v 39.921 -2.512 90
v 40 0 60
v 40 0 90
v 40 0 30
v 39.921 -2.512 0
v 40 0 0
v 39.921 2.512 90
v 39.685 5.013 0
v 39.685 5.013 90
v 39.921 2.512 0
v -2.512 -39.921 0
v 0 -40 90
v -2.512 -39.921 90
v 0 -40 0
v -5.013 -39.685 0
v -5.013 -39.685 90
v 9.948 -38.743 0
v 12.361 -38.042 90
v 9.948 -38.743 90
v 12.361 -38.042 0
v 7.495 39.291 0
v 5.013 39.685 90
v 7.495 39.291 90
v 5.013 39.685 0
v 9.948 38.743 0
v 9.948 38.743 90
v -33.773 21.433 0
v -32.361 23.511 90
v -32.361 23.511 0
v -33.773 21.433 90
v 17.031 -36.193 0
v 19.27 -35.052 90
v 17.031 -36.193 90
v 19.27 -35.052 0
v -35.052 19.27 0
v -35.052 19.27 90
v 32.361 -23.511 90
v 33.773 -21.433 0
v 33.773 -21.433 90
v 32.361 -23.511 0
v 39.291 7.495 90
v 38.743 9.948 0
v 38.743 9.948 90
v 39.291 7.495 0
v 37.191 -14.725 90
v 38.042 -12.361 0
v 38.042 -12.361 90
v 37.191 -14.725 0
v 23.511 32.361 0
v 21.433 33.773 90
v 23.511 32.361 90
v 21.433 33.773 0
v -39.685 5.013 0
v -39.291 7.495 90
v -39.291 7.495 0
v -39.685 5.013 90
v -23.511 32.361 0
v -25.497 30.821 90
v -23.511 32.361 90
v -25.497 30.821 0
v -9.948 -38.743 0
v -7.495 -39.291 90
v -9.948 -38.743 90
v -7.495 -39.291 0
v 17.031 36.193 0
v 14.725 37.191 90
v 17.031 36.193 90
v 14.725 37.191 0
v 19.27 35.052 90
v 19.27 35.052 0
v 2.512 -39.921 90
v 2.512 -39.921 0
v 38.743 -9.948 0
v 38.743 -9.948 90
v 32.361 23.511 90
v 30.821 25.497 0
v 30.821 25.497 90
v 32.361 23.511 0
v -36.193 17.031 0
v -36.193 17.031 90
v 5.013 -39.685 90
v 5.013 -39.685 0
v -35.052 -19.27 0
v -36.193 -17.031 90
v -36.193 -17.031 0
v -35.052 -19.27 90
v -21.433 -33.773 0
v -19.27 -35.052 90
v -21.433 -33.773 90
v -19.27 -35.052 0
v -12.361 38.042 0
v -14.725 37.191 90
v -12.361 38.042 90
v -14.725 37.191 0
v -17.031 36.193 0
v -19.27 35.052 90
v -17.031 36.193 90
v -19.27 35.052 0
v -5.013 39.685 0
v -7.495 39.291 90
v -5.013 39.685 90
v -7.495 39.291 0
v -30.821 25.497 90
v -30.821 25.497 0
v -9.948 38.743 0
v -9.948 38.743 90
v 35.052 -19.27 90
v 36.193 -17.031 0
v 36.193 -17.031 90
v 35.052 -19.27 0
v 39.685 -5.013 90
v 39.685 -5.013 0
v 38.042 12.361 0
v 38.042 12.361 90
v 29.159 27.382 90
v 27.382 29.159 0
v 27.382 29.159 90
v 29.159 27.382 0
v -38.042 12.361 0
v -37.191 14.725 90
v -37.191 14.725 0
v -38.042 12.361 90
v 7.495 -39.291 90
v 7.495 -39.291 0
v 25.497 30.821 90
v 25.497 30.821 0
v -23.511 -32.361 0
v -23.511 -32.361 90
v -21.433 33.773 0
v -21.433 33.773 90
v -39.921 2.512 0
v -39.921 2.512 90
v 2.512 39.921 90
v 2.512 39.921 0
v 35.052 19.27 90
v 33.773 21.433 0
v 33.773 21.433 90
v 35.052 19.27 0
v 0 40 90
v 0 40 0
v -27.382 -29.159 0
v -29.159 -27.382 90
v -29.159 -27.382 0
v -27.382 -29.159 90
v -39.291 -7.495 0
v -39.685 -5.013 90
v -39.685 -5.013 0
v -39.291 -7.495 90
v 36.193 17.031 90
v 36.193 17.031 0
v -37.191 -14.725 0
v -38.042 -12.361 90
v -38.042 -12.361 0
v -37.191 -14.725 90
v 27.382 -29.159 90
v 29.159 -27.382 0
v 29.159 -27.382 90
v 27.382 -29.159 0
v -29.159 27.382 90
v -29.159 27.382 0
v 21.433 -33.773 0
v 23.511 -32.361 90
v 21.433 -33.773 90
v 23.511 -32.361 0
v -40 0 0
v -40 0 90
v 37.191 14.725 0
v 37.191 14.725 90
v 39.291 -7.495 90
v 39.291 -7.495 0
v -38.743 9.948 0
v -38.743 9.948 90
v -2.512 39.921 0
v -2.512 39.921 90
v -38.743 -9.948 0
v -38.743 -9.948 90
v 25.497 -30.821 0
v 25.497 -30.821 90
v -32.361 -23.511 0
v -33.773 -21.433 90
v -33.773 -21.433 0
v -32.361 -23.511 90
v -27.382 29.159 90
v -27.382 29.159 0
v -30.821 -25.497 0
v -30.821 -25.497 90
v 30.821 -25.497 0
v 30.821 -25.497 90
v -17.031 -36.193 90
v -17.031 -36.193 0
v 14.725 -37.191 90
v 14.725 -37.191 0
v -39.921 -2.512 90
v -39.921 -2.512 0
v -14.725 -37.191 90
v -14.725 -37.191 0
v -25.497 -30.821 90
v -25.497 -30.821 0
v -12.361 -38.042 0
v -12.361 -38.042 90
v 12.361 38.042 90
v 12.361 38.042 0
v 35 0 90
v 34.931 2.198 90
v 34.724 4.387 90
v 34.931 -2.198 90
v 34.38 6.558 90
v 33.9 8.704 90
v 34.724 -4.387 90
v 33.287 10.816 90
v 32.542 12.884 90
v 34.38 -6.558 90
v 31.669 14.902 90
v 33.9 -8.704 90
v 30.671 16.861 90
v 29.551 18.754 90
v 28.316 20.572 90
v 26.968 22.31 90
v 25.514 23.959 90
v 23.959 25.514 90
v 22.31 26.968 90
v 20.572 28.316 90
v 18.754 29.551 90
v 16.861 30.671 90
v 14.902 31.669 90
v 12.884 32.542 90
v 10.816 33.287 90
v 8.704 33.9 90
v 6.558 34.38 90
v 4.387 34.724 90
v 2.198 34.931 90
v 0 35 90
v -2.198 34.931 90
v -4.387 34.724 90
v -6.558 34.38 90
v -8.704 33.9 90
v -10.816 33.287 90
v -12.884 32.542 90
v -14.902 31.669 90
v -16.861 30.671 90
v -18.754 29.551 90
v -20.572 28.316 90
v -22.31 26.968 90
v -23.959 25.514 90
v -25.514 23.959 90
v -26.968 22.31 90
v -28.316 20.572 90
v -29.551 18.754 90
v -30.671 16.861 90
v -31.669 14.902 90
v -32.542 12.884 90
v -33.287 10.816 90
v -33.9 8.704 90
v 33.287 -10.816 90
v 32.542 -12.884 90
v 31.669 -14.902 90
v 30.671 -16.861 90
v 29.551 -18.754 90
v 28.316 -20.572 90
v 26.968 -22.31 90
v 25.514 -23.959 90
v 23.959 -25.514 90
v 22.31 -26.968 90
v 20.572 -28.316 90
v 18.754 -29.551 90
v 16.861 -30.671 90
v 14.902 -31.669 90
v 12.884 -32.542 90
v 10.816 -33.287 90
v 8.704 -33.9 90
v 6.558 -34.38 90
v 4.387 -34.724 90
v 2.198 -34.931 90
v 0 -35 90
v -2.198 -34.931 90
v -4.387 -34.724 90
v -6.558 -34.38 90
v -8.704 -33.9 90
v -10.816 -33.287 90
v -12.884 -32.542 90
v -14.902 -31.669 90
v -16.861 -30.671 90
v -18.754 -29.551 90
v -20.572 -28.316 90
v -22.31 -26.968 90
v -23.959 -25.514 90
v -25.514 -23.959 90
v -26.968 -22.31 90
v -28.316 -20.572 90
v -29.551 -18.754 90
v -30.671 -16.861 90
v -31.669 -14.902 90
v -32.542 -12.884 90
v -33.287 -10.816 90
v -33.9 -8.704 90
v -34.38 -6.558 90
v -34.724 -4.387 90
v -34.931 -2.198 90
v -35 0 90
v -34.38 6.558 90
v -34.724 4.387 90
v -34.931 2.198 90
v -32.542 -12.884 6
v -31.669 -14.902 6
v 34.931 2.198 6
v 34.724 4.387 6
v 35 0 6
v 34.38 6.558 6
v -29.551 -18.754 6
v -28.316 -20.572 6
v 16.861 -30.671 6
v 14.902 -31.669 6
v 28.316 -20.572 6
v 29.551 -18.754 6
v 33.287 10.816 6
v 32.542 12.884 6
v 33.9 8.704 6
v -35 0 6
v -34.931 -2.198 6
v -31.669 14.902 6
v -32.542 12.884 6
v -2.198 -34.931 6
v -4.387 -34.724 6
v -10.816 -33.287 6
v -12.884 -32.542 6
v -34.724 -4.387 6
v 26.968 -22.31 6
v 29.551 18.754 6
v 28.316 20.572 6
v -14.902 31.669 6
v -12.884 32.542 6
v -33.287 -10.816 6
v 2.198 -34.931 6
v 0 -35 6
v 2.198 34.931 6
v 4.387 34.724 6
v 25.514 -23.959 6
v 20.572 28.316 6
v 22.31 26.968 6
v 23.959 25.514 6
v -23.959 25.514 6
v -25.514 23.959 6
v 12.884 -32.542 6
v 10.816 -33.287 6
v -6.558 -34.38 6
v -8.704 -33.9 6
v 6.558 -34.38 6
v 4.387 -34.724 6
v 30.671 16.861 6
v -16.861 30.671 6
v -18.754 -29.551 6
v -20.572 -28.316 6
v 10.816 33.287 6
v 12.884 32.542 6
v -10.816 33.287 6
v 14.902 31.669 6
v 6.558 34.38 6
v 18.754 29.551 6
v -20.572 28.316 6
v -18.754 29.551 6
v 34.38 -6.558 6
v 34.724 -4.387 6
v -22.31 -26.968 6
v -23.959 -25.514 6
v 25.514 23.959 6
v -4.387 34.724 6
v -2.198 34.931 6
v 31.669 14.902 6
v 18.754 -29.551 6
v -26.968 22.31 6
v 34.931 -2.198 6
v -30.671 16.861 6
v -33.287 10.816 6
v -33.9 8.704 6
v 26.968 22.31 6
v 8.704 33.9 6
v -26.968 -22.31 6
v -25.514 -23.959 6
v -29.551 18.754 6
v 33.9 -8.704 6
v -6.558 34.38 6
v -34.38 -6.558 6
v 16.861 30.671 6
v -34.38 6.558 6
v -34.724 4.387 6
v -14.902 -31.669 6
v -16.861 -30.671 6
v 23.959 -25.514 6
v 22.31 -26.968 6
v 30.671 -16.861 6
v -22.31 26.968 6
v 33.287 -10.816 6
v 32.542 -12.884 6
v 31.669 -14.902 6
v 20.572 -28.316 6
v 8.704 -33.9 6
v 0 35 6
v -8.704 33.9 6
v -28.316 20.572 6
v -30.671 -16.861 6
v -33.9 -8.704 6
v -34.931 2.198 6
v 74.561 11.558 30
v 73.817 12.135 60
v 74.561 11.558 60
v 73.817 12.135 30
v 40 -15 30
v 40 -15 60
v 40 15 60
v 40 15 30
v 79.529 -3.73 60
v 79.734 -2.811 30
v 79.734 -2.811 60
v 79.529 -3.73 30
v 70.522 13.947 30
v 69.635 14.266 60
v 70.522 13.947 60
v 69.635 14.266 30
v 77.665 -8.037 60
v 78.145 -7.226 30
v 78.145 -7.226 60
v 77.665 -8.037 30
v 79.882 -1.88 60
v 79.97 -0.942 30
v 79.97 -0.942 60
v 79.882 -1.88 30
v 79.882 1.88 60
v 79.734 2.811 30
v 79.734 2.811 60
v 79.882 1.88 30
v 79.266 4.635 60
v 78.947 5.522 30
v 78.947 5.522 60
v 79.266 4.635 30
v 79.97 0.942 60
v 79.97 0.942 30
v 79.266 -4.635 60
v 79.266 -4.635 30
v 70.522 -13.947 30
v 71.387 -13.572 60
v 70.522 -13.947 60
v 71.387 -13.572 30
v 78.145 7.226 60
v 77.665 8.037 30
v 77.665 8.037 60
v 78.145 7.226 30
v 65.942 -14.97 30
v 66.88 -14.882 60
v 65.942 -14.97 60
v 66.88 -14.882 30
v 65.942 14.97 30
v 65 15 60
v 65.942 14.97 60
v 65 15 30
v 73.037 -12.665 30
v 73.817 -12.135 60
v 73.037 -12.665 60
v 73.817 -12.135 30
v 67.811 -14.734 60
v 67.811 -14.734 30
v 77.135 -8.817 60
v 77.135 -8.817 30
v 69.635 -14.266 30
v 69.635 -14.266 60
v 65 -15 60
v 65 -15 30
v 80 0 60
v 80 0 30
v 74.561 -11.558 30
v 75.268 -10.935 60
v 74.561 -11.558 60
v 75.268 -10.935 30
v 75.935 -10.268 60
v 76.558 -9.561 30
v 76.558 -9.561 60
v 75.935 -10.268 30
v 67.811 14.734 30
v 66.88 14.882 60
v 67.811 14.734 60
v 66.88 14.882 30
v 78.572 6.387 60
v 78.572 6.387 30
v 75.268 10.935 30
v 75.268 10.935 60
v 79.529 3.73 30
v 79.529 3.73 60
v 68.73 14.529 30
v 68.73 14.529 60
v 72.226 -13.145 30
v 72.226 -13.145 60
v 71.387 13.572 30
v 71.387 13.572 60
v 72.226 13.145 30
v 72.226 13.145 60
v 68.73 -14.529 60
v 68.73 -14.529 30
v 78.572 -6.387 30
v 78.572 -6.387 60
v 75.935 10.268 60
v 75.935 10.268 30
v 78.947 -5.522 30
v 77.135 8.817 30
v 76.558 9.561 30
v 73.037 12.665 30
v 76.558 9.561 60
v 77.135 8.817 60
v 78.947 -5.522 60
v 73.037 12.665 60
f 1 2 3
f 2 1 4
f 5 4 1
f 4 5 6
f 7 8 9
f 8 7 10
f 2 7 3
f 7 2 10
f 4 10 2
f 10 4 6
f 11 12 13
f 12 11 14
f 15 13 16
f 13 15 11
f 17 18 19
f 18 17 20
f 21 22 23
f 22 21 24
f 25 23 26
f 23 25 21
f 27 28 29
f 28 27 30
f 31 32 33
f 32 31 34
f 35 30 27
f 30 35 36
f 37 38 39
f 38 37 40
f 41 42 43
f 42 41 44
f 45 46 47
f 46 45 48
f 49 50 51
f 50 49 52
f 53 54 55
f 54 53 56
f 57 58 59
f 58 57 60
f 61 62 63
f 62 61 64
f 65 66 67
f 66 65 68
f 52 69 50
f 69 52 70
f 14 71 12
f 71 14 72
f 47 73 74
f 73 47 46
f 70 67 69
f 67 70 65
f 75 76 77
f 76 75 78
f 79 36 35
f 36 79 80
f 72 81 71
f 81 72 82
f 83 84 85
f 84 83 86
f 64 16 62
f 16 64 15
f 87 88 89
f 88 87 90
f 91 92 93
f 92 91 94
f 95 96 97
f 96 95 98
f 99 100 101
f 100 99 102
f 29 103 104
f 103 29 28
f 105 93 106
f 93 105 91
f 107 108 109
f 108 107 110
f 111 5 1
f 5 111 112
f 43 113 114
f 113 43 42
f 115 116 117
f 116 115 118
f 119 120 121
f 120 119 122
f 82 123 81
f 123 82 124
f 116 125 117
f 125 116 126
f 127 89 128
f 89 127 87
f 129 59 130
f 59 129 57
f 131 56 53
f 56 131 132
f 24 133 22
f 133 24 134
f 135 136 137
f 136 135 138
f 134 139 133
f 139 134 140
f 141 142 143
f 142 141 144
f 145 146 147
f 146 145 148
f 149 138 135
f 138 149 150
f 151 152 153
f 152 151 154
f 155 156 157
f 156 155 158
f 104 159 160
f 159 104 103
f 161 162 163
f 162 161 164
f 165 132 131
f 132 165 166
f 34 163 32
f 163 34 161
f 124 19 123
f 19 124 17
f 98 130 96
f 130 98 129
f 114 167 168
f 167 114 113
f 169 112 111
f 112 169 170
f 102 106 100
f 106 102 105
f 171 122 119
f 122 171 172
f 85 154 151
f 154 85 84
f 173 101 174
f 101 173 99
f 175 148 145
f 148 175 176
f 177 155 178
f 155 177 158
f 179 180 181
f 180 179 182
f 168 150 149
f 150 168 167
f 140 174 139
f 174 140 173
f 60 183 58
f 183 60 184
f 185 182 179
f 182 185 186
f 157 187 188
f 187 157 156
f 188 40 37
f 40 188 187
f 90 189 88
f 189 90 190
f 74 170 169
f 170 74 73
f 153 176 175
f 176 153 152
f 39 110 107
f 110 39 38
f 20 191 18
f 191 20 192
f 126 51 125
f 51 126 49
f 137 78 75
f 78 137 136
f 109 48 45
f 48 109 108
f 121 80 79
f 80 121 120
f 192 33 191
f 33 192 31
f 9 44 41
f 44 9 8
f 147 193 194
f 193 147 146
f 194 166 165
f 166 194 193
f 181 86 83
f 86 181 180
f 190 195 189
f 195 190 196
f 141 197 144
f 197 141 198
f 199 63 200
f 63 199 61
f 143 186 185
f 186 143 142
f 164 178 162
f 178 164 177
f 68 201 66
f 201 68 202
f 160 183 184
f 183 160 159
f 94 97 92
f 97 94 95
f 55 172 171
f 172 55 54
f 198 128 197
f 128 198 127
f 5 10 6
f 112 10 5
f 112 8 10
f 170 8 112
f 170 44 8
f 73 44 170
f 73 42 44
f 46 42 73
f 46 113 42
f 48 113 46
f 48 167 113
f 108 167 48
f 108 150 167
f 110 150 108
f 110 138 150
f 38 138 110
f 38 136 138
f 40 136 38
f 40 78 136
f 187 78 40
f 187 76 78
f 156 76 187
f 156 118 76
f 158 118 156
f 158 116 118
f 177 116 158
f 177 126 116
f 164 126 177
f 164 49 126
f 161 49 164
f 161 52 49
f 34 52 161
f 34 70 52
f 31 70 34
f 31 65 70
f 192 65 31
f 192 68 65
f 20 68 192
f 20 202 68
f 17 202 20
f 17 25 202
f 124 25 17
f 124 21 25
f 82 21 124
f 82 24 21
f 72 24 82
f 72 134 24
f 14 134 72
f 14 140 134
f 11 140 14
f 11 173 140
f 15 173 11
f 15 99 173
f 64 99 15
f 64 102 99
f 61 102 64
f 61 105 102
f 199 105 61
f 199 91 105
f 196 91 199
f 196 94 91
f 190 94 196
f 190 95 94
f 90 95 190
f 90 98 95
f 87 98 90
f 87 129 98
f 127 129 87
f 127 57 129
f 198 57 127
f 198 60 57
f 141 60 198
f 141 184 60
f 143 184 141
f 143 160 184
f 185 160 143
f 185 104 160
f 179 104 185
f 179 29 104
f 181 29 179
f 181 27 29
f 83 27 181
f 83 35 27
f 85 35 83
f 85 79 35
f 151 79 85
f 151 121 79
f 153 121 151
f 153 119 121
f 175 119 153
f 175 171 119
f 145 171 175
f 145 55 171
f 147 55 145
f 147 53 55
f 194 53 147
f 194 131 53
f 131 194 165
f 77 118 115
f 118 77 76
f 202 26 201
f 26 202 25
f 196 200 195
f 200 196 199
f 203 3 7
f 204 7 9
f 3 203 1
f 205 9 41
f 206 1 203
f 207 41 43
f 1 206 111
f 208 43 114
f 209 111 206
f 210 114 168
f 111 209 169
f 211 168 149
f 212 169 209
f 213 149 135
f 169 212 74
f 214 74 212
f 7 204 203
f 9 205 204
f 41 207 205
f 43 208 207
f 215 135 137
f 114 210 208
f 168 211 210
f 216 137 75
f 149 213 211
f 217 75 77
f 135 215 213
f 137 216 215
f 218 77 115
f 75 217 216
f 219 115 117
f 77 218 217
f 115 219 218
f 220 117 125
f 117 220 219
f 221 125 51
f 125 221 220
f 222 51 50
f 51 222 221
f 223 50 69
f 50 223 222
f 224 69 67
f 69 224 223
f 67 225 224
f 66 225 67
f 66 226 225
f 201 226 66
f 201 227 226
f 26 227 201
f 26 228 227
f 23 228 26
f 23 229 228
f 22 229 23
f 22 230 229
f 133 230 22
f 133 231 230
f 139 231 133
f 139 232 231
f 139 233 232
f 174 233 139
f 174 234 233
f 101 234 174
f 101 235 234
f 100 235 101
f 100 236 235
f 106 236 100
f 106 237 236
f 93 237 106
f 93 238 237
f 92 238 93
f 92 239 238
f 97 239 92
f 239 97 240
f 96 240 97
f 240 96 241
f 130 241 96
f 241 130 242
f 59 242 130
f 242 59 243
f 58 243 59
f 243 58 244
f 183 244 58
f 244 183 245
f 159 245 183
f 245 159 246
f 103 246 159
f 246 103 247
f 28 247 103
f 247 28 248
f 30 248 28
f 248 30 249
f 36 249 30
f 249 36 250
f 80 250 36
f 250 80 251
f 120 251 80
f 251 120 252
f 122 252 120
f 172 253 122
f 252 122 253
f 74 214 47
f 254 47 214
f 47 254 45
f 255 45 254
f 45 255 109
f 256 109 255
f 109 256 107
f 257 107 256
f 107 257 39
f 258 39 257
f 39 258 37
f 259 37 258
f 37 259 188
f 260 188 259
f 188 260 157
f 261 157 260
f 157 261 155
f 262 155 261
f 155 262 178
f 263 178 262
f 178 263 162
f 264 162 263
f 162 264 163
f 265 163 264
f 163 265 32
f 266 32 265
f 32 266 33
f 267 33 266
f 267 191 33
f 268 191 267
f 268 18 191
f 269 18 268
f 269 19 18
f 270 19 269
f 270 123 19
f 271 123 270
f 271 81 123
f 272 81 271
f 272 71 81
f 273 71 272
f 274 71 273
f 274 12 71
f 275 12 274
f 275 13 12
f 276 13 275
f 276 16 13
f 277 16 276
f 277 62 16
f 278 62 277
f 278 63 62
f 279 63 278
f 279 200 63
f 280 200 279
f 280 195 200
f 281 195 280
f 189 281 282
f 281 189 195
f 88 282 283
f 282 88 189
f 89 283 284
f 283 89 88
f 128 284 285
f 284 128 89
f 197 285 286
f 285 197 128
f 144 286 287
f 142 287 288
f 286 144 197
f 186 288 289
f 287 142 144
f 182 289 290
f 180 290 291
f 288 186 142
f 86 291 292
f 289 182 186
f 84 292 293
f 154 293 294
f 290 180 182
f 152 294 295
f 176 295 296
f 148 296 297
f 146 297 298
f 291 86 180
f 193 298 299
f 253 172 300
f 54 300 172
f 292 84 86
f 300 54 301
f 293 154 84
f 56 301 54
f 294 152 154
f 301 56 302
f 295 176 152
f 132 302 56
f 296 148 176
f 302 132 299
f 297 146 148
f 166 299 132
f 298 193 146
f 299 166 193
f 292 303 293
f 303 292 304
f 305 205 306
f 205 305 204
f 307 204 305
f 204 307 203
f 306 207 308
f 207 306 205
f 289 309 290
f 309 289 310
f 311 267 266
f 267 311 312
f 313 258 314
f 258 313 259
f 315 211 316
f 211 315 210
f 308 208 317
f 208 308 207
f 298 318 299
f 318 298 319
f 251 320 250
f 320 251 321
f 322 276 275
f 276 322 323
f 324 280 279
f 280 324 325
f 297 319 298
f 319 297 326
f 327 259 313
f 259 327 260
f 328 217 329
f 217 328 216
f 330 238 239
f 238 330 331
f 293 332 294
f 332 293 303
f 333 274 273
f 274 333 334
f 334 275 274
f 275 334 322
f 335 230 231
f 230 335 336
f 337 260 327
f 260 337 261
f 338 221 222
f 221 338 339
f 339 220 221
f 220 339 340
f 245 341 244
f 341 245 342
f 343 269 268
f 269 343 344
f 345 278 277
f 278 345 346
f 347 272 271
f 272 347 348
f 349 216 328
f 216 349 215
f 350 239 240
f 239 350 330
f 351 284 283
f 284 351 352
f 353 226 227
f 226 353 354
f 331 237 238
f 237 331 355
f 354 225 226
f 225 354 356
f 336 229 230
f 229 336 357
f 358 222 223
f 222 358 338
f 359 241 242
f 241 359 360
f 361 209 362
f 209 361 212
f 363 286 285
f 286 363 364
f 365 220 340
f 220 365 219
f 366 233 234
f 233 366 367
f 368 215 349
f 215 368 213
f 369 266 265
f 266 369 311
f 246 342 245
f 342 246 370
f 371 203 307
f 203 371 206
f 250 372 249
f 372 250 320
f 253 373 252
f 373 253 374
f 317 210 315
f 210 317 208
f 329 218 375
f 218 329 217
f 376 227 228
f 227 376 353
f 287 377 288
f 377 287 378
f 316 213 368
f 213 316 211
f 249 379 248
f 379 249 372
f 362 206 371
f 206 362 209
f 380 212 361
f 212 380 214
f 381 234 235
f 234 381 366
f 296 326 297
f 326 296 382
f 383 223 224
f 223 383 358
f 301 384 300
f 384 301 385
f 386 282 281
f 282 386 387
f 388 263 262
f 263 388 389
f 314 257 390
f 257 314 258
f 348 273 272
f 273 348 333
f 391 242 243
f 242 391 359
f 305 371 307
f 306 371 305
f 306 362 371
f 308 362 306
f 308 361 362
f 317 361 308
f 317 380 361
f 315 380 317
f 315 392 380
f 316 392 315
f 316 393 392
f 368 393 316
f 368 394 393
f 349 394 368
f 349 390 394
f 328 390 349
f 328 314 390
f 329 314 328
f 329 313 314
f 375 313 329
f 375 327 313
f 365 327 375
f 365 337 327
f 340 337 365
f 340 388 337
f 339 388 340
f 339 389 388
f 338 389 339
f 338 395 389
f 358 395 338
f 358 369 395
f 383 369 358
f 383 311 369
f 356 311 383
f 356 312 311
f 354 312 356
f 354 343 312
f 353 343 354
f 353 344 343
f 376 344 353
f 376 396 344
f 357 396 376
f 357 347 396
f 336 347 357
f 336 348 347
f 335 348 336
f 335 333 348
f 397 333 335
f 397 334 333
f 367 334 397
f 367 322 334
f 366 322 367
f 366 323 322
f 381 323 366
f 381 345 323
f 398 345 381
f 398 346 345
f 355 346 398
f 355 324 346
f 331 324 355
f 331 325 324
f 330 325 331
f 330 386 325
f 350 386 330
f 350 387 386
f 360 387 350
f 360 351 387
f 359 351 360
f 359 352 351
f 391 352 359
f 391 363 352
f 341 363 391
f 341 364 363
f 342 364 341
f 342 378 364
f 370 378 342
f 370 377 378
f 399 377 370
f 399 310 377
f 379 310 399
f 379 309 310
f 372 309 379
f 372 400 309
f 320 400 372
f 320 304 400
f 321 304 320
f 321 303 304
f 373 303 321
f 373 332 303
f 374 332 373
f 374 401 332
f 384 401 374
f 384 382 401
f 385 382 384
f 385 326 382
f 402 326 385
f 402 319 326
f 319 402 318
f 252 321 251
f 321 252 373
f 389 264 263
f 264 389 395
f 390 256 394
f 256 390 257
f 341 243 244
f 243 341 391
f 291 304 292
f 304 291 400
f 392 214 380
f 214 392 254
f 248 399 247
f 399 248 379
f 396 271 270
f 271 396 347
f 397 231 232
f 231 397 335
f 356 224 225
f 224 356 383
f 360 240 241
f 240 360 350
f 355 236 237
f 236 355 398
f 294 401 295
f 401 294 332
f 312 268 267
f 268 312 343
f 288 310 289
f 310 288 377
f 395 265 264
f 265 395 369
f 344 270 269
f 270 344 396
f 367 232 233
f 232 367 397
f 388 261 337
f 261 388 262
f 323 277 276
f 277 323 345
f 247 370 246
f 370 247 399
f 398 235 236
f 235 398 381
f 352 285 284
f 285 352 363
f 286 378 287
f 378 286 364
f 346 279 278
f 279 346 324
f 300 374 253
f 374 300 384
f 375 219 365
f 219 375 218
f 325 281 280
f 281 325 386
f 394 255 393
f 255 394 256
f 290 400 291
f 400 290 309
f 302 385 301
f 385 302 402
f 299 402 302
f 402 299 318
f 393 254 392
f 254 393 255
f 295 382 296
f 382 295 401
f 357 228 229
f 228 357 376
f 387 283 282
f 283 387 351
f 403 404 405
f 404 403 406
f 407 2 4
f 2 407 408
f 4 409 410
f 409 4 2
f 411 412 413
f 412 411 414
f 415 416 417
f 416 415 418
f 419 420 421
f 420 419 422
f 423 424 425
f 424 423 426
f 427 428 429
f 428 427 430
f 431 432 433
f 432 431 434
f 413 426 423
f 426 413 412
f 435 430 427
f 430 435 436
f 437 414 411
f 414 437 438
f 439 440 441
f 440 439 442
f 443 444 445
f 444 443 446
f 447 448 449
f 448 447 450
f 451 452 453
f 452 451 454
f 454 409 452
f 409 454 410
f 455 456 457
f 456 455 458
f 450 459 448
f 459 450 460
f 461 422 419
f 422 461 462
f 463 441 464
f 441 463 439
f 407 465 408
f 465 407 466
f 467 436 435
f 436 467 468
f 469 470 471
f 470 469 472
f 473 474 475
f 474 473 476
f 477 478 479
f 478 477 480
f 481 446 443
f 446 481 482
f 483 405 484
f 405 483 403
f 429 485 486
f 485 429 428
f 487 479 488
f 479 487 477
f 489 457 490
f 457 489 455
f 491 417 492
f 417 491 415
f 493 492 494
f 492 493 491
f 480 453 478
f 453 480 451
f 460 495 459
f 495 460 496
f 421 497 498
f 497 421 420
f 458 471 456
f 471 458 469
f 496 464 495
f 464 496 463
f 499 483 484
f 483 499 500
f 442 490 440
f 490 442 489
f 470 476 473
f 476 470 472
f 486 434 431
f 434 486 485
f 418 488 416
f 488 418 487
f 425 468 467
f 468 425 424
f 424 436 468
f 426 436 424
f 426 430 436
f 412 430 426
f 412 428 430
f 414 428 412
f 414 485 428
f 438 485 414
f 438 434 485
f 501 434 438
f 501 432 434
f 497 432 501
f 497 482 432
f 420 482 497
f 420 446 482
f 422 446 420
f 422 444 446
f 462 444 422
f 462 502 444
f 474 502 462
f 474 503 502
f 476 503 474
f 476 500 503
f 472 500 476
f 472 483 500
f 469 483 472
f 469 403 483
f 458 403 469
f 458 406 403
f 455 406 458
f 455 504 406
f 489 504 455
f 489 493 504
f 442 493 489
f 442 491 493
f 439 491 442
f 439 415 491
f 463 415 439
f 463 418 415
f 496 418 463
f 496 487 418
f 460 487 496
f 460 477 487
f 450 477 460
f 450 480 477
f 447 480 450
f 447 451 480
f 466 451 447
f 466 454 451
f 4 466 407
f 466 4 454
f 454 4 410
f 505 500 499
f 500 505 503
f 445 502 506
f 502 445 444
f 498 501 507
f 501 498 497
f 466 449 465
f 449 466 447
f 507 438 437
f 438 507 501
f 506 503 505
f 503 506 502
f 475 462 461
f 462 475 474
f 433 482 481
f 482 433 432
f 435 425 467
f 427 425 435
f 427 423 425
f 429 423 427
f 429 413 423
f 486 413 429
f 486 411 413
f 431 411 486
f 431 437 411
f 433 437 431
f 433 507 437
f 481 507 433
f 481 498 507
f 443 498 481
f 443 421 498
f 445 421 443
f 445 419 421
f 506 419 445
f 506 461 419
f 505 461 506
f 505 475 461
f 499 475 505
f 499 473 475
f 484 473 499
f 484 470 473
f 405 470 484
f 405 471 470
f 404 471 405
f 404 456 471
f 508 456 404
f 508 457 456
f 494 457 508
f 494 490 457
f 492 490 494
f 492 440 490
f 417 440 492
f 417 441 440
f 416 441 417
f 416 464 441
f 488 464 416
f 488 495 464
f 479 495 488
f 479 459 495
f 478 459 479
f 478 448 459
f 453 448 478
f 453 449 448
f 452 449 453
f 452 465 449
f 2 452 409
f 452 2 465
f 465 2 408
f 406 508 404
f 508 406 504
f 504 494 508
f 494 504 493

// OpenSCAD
// mug with D‐shaped handle on +X side
outer_d        = 80;   // outer diameter of mug
inner_d        = 70;   // inner diameter of mug
height         = 90;   // total mug height
bottom_thick   = 6;    // bottom thickness
open_w         = 25;   // finger‐hole width
open_h         = 30;   // finger‐hole height
h_thick        = 15;   // handle wall thickness (radius of outer arc)
$fn            = 100;  // resolution

module mug() {
  difference() {
    // outer shell
    cylinder(d = outer_d, h = height, $fn = $fn);
    // hollow interior
    translate([0,0,bottom_thick])
      cylinder(d = inner_d, h = height - bottom_thick, $fn = $fn);
  }
}

module handle2d() {
  // 2D profile of the D‐shape (in the X–Y plane)
  inner_x      = outer_d/2;           // flat‐face at mug outer
  arc_cx       = inner_x + open_w;    // center of semicircle
  union() {
    // rectangular segment from flat face to start of arc
    translate([inner_x, -h_thick])
      square([open_w, 2*h_thick], center = false);
    // outer semicircle (right half of a full circle)
    intersection() {
      translate([arc_cx, 0])
        circle(r = h_thick, $fn = $fn);
      // clip to x >= arc_cx (to keep only the right half)
      translate([arc_cx, -100])
        square([h_thick, 200], center = false);
    }
  }
}

module handle() {
  // place handle at mid‐height, extrude the 2D D‐profile by open_h
  translate([0, 0, height/2 - open_h/2])
    linear_extrude(height = open_h)
      handle2d();
}

union() {
  mug();
  handle();
}
